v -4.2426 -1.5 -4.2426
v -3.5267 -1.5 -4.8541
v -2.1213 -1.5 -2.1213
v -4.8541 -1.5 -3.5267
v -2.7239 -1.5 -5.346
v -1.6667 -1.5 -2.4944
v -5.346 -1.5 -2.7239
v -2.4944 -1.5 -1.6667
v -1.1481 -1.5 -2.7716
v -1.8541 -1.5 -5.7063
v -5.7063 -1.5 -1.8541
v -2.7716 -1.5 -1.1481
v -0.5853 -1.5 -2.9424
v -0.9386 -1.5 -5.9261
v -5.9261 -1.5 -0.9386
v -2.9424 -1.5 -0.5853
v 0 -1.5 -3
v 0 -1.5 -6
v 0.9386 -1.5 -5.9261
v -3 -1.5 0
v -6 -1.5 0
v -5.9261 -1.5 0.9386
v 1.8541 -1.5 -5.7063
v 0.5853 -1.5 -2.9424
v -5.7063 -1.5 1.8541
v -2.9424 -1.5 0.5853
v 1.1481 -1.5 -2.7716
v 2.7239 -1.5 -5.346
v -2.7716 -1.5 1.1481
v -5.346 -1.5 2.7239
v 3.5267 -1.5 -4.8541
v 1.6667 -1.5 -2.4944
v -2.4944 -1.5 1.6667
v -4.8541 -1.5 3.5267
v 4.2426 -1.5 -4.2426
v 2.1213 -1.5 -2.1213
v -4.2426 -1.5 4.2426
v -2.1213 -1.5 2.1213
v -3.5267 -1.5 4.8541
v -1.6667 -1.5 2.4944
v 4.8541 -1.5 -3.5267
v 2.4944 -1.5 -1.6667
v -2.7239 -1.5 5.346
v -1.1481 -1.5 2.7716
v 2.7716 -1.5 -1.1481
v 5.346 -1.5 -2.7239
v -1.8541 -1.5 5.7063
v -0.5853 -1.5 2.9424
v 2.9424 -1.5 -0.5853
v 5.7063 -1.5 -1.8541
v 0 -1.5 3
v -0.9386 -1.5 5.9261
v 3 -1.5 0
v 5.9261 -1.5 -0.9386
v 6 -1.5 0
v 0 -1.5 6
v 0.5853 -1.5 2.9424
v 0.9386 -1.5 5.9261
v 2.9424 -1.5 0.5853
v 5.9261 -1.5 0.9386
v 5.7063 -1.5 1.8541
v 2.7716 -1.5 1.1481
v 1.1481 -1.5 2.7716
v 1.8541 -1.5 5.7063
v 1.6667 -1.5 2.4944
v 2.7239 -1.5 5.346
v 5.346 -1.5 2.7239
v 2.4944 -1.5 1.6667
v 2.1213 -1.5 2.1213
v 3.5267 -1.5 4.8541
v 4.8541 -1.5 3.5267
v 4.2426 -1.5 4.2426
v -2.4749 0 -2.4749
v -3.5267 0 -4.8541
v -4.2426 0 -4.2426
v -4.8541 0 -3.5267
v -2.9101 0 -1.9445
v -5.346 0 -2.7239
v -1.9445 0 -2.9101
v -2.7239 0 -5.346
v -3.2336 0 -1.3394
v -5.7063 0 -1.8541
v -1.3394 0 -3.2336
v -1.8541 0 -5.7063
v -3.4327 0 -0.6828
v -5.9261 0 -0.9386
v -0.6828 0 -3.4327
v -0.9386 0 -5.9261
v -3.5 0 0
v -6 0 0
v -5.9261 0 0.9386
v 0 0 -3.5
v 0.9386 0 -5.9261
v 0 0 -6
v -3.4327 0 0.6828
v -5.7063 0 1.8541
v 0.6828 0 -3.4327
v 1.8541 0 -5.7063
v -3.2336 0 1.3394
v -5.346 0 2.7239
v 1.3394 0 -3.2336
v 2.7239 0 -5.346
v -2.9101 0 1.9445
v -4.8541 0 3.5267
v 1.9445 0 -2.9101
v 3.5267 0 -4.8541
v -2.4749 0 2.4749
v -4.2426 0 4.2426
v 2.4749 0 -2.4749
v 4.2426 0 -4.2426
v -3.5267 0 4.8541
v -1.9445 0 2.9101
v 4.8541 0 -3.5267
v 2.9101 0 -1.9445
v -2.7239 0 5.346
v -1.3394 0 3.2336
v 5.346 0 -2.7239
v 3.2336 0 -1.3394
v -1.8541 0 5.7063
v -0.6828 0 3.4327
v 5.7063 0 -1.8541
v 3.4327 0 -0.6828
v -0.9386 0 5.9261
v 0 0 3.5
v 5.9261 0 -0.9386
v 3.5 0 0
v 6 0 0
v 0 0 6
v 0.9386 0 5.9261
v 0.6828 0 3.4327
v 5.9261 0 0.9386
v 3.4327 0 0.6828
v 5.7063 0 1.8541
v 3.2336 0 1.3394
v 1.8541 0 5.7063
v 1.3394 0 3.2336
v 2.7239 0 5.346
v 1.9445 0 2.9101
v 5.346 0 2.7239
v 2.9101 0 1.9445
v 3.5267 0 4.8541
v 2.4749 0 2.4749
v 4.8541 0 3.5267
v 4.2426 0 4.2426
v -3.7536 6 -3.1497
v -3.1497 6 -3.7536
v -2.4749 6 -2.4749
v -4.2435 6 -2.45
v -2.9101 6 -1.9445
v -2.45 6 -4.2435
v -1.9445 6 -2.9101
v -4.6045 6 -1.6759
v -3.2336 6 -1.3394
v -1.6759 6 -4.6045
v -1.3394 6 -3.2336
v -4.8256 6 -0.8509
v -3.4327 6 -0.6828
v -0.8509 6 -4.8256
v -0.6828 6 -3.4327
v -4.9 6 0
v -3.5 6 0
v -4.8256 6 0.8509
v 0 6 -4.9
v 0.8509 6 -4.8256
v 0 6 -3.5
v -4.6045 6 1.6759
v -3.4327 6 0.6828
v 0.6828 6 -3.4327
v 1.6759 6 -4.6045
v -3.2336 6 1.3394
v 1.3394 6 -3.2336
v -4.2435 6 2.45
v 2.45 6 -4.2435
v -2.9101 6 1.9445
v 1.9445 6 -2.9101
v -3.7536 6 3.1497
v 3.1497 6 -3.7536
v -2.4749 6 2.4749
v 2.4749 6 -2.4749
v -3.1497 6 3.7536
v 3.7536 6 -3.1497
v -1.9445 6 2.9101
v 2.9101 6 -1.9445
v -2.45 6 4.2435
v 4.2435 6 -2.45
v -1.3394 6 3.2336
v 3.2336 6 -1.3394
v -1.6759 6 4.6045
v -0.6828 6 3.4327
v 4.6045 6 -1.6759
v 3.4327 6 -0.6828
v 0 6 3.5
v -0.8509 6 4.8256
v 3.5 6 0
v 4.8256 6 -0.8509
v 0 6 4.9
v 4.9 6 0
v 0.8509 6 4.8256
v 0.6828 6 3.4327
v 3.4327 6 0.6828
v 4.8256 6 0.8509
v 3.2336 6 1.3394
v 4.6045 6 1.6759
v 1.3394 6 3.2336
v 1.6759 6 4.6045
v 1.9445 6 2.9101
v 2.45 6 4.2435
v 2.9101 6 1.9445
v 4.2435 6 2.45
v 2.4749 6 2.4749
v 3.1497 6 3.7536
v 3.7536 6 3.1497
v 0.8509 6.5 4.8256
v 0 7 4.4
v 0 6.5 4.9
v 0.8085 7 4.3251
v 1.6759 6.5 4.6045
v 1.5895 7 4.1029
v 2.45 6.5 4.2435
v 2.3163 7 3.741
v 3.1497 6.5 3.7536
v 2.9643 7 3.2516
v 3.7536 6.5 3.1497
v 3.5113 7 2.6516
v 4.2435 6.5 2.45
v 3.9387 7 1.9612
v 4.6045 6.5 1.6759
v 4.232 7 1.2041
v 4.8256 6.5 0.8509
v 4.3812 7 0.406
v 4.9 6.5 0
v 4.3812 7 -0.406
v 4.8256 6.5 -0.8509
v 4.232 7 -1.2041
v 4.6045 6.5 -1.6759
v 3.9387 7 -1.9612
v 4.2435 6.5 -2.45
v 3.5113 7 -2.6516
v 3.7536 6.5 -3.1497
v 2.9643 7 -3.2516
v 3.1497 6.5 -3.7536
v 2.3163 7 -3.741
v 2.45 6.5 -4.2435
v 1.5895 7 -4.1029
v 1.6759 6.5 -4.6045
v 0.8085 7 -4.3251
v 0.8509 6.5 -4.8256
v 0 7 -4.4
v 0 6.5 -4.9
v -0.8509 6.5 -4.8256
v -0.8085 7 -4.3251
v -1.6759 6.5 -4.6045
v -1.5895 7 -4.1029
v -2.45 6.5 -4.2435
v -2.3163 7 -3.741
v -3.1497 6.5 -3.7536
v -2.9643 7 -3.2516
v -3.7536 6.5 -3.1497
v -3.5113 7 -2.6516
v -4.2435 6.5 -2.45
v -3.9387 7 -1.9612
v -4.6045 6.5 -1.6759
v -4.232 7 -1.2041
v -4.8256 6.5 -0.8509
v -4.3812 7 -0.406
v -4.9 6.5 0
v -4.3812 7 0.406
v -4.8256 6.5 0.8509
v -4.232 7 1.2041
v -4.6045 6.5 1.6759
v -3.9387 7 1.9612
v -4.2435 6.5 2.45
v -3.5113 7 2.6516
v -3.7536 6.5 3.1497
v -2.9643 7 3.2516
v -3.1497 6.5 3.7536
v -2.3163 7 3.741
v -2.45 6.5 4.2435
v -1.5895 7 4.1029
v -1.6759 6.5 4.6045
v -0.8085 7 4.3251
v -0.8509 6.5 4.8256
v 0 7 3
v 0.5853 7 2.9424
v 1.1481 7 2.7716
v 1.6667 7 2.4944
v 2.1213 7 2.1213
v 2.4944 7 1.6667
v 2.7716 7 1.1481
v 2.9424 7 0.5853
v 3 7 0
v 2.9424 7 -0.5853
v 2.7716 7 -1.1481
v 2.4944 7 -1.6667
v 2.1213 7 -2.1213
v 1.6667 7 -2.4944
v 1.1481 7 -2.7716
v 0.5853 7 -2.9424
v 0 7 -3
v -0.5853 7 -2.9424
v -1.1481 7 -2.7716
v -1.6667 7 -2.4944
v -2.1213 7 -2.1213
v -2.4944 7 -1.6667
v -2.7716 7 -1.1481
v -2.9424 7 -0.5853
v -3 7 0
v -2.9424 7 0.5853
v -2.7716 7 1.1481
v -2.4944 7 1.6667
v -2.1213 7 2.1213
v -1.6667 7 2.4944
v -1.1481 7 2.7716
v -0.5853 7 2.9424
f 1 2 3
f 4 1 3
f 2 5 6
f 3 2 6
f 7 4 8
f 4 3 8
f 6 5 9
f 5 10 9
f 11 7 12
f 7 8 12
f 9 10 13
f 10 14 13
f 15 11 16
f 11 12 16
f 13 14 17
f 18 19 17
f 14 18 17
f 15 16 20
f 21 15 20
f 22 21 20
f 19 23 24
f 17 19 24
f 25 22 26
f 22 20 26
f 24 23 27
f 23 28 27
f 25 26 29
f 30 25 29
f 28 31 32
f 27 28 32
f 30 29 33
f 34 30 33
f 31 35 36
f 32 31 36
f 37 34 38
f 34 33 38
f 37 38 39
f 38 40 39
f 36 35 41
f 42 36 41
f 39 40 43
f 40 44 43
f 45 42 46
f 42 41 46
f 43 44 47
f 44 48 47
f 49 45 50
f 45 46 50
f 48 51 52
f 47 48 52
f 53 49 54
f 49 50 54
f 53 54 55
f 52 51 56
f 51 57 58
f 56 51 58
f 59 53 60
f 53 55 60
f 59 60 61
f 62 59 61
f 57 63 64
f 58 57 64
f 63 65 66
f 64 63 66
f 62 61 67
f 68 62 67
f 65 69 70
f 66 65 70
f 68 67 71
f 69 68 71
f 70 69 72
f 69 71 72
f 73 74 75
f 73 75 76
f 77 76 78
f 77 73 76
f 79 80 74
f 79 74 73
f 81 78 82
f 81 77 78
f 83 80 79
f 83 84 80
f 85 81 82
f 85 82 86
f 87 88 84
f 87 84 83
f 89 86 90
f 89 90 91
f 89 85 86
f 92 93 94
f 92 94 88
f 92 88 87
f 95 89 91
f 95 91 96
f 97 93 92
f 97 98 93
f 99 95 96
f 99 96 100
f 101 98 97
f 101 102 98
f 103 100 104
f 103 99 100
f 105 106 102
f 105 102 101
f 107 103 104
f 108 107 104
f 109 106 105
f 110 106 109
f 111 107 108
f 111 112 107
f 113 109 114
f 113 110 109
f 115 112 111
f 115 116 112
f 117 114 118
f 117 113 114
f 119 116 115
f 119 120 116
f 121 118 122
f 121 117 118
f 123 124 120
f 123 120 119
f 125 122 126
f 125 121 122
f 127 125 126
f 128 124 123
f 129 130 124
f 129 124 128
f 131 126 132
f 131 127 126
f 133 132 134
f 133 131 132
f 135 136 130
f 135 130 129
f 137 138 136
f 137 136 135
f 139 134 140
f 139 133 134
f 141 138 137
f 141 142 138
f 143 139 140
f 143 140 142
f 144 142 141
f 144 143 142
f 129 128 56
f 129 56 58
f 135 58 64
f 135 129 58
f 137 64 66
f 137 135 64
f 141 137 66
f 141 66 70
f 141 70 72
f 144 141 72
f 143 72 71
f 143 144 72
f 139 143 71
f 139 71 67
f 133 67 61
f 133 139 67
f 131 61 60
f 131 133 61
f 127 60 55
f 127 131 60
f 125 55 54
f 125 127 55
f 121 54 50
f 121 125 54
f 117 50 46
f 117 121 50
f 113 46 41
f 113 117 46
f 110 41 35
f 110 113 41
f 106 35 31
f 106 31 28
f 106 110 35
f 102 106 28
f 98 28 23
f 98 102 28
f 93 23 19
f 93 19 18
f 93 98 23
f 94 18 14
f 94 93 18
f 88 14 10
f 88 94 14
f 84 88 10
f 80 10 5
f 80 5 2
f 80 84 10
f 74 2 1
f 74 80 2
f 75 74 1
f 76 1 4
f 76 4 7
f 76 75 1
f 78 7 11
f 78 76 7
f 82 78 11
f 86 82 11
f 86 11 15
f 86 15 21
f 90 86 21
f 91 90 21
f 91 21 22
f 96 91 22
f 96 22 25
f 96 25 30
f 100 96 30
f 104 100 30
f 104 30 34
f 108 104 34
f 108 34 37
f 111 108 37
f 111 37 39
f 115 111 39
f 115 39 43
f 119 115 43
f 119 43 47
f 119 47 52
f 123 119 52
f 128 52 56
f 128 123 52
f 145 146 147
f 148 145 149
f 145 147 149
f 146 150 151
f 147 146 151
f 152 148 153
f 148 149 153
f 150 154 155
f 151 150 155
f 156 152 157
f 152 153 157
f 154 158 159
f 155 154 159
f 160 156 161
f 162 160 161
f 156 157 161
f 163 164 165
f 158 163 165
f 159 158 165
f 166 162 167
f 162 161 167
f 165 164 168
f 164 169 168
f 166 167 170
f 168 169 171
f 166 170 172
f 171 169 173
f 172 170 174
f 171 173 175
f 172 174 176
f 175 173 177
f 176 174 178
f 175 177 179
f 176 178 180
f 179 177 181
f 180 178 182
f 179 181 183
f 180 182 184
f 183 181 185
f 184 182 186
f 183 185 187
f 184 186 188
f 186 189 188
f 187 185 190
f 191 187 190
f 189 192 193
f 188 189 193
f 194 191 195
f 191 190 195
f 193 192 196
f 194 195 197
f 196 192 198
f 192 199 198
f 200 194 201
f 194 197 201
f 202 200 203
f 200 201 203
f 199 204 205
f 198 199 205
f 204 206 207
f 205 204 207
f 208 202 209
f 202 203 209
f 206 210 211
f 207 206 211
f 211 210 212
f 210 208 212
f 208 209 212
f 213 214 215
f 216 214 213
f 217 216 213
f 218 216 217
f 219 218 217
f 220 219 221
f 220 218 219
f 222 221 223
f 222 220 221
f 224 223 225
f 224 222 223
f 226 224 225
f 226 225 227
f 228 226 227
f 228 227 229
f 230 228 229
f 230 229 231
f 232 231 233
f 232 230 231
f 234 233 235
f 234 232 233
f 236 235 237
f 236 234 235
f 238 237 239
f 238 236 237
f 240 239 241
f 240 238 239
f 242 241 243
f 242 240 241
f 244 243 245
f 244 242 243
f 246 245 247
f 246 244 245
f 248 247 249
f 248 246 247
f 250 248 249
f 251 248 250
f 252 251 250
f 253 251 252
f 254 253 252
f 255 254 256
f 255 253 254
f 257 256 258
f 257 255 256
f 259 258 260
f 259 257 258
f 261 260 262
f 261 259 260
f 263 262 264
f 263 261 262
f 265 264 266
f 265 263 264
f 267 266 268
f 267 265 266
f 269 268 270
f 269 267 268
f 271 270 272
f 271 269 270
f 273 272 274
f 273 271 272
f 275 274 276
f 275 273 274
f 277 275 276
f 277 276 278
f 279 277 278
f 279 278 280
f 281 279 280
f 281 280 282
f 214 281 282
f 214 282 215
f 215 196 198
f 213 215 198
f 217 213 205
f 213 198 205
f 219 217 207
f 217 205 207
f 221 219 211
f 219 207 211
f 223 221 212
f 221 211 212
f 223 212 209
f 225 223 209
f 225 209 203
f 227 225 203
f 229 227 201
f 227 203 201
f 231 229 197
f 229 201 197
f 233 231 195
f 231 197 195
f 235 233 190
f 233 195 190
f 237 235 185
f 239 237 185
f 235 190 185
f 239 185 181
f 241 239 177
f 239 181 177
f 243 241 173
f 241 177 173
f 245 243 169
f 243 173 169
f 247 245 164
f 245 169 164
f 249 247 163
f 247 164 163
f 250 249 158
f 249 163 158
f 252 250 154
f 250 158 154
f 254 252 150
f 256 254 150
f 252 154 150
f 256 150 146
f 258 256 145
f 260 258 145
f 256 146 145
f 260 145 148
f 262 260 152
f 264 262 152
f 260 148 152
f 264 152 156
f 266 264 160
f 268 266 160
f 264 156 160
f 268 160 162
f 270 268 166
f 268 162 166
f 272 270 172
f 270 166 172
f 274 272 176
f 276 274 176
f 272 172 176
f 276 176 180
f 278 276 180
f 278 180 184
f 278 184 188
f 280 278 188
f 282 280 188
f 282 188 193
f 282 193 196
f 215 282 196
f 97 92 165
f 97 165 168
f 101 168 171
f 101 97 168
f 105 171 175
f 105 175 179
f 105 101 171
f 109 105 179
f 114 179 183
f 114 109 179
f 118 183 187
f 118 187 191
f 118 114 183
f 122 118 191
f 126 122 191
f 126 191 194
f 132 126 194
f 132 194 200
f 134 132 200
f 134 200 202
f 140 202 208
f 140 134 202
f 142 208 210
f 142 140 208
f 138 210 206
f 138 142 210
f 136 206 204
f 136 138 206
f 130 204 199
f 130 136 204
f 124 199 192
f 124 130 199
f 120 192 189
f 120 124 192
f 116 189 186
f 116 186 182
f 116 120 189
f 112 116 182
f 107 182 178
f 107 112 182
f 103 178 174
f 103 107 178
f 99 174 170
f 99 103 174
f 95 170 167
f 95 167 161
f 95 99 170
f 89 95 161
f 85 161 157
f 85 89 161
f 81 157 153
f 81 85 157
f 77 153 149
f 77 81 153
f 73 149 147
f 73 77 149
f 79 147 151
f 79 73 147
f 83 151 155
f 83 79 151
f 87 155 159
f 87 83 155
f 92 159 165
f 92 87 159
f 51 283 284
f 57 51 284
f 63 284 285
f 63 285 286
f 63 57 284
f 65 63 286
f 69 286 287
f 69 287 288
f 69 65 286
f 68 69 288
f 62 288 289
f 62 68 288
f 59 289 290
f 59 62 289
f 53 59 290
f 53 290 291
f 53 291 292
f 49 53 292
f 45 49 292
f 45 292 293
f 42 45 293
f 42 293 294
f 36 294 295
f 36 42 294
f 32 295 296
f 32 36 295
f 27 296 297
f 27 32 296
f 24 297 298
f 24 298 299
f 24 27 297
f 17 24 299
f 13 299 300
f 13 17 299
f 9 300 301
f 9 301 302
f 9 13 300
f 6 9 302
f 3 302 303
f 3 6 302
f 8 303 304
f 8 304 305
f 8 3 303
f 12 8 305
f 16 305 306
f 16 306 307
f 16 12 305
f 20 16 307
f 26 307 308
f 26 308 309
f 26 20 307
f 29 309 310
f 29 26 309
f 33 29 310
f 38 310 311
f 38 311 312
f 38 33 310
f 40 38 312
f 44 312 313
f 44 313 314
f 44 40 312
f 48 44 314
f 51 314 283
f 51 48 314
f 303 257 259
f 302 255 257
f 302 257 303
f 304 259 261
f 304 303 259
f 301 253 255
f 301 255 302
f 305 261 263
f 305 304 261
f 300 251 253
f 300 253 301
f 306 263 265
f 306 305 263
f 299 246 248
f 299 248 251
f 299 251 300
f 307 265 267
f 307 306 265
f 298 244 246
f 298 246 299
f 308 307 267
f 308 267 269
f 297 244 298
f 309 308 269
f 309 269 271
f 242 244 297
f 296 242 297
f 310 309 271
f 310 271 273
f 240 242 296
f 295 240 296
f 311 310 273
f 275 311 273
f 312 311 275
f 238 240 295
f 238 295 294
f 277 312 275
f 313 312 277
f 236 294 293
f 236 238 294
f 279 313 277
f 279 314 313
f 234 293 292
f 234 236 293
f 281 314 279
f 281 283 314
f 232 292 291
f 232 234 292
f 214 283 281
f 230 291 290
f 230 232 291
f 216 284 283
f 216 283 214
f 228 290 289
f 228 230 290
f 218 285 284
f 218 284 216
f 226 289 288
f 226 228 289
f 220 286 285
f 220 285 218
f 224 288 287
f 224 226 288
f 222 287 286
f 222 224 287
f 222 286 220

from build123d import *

# Parameters (mm, degrees)
HEADS_R                     = 6
HEAD_DEPTH                  = 1.5
TUBEENCAPSULATIONBODYS_R    = 3.5
TUBEENCAPSULATIONBODY_DEPTH = 6
TUBEACCESSS_R               = 3
TUBEACCESS_DEPTH            = 12.324751653
LOCKINGBODYS_R              = 4.9
LOCKINGBODYS_R_2            = 3
LOCKINGBODY_DEPTH           = 1
OPENCLAMPC_SIZE             = 0.5


with BuildPart() as part:
    # HeadS → Head (new body)
    with BuildSketch(Plane(origin=(0, 0, 0), x_dir=(1, 0, 0), z_dir=(0, 1, 0))):
        Circle(HEADS_R)
    extrude(amount=-HEAD_DEPTH)

    # TubeEncapsulationBodyS → TubeEncapsulationBody (add)
    with BuildSketch(Plane(origin=(0, 0, 0), x_dir=(-1, 0, 0), z_dir=(0, -1, 0))):
        Circle(TUBEENCAPSULATIONBODYS_R)
    extrude(amount=-TUBEENCAPSULATIONBODY_DEPTH)

    # TubeAccessS → TubeAccess (cut, through all)
    with BuildSketch(Plane(origin=(0, -1.5, 0), x_dir=(1, 0, 0), z_dir=(0, 1, 0))):
        Circle(TUBEACCESSS_R)
    extrude(amount=TUBEACCESS_DEPTH, mode=Mode.SUBTRACT)

    # LockingBodyS → LockingBody (add)
    with BuildSketch(Plane(origin=(0, 6, 0), x_dir=(1, 0, 0), z_dir=(0, 1, 0))):
        Circle(LOCKINGBODYS_R)
        Circle(LOCKINGBODYS_R_2, mode=Mode.SUBTRACT)
    extrude(amount=LOCKINGBODY_DEPTH)

    # OpenClampC
    openclampc_edges = [part.edges().sort_by_distance(p)[0] for p in [
        (-4.9, 7, 0),
    ]]
    chamfer(openclampc_edges, length=OPENCLAMPC_SIZE)


solid = part.part
